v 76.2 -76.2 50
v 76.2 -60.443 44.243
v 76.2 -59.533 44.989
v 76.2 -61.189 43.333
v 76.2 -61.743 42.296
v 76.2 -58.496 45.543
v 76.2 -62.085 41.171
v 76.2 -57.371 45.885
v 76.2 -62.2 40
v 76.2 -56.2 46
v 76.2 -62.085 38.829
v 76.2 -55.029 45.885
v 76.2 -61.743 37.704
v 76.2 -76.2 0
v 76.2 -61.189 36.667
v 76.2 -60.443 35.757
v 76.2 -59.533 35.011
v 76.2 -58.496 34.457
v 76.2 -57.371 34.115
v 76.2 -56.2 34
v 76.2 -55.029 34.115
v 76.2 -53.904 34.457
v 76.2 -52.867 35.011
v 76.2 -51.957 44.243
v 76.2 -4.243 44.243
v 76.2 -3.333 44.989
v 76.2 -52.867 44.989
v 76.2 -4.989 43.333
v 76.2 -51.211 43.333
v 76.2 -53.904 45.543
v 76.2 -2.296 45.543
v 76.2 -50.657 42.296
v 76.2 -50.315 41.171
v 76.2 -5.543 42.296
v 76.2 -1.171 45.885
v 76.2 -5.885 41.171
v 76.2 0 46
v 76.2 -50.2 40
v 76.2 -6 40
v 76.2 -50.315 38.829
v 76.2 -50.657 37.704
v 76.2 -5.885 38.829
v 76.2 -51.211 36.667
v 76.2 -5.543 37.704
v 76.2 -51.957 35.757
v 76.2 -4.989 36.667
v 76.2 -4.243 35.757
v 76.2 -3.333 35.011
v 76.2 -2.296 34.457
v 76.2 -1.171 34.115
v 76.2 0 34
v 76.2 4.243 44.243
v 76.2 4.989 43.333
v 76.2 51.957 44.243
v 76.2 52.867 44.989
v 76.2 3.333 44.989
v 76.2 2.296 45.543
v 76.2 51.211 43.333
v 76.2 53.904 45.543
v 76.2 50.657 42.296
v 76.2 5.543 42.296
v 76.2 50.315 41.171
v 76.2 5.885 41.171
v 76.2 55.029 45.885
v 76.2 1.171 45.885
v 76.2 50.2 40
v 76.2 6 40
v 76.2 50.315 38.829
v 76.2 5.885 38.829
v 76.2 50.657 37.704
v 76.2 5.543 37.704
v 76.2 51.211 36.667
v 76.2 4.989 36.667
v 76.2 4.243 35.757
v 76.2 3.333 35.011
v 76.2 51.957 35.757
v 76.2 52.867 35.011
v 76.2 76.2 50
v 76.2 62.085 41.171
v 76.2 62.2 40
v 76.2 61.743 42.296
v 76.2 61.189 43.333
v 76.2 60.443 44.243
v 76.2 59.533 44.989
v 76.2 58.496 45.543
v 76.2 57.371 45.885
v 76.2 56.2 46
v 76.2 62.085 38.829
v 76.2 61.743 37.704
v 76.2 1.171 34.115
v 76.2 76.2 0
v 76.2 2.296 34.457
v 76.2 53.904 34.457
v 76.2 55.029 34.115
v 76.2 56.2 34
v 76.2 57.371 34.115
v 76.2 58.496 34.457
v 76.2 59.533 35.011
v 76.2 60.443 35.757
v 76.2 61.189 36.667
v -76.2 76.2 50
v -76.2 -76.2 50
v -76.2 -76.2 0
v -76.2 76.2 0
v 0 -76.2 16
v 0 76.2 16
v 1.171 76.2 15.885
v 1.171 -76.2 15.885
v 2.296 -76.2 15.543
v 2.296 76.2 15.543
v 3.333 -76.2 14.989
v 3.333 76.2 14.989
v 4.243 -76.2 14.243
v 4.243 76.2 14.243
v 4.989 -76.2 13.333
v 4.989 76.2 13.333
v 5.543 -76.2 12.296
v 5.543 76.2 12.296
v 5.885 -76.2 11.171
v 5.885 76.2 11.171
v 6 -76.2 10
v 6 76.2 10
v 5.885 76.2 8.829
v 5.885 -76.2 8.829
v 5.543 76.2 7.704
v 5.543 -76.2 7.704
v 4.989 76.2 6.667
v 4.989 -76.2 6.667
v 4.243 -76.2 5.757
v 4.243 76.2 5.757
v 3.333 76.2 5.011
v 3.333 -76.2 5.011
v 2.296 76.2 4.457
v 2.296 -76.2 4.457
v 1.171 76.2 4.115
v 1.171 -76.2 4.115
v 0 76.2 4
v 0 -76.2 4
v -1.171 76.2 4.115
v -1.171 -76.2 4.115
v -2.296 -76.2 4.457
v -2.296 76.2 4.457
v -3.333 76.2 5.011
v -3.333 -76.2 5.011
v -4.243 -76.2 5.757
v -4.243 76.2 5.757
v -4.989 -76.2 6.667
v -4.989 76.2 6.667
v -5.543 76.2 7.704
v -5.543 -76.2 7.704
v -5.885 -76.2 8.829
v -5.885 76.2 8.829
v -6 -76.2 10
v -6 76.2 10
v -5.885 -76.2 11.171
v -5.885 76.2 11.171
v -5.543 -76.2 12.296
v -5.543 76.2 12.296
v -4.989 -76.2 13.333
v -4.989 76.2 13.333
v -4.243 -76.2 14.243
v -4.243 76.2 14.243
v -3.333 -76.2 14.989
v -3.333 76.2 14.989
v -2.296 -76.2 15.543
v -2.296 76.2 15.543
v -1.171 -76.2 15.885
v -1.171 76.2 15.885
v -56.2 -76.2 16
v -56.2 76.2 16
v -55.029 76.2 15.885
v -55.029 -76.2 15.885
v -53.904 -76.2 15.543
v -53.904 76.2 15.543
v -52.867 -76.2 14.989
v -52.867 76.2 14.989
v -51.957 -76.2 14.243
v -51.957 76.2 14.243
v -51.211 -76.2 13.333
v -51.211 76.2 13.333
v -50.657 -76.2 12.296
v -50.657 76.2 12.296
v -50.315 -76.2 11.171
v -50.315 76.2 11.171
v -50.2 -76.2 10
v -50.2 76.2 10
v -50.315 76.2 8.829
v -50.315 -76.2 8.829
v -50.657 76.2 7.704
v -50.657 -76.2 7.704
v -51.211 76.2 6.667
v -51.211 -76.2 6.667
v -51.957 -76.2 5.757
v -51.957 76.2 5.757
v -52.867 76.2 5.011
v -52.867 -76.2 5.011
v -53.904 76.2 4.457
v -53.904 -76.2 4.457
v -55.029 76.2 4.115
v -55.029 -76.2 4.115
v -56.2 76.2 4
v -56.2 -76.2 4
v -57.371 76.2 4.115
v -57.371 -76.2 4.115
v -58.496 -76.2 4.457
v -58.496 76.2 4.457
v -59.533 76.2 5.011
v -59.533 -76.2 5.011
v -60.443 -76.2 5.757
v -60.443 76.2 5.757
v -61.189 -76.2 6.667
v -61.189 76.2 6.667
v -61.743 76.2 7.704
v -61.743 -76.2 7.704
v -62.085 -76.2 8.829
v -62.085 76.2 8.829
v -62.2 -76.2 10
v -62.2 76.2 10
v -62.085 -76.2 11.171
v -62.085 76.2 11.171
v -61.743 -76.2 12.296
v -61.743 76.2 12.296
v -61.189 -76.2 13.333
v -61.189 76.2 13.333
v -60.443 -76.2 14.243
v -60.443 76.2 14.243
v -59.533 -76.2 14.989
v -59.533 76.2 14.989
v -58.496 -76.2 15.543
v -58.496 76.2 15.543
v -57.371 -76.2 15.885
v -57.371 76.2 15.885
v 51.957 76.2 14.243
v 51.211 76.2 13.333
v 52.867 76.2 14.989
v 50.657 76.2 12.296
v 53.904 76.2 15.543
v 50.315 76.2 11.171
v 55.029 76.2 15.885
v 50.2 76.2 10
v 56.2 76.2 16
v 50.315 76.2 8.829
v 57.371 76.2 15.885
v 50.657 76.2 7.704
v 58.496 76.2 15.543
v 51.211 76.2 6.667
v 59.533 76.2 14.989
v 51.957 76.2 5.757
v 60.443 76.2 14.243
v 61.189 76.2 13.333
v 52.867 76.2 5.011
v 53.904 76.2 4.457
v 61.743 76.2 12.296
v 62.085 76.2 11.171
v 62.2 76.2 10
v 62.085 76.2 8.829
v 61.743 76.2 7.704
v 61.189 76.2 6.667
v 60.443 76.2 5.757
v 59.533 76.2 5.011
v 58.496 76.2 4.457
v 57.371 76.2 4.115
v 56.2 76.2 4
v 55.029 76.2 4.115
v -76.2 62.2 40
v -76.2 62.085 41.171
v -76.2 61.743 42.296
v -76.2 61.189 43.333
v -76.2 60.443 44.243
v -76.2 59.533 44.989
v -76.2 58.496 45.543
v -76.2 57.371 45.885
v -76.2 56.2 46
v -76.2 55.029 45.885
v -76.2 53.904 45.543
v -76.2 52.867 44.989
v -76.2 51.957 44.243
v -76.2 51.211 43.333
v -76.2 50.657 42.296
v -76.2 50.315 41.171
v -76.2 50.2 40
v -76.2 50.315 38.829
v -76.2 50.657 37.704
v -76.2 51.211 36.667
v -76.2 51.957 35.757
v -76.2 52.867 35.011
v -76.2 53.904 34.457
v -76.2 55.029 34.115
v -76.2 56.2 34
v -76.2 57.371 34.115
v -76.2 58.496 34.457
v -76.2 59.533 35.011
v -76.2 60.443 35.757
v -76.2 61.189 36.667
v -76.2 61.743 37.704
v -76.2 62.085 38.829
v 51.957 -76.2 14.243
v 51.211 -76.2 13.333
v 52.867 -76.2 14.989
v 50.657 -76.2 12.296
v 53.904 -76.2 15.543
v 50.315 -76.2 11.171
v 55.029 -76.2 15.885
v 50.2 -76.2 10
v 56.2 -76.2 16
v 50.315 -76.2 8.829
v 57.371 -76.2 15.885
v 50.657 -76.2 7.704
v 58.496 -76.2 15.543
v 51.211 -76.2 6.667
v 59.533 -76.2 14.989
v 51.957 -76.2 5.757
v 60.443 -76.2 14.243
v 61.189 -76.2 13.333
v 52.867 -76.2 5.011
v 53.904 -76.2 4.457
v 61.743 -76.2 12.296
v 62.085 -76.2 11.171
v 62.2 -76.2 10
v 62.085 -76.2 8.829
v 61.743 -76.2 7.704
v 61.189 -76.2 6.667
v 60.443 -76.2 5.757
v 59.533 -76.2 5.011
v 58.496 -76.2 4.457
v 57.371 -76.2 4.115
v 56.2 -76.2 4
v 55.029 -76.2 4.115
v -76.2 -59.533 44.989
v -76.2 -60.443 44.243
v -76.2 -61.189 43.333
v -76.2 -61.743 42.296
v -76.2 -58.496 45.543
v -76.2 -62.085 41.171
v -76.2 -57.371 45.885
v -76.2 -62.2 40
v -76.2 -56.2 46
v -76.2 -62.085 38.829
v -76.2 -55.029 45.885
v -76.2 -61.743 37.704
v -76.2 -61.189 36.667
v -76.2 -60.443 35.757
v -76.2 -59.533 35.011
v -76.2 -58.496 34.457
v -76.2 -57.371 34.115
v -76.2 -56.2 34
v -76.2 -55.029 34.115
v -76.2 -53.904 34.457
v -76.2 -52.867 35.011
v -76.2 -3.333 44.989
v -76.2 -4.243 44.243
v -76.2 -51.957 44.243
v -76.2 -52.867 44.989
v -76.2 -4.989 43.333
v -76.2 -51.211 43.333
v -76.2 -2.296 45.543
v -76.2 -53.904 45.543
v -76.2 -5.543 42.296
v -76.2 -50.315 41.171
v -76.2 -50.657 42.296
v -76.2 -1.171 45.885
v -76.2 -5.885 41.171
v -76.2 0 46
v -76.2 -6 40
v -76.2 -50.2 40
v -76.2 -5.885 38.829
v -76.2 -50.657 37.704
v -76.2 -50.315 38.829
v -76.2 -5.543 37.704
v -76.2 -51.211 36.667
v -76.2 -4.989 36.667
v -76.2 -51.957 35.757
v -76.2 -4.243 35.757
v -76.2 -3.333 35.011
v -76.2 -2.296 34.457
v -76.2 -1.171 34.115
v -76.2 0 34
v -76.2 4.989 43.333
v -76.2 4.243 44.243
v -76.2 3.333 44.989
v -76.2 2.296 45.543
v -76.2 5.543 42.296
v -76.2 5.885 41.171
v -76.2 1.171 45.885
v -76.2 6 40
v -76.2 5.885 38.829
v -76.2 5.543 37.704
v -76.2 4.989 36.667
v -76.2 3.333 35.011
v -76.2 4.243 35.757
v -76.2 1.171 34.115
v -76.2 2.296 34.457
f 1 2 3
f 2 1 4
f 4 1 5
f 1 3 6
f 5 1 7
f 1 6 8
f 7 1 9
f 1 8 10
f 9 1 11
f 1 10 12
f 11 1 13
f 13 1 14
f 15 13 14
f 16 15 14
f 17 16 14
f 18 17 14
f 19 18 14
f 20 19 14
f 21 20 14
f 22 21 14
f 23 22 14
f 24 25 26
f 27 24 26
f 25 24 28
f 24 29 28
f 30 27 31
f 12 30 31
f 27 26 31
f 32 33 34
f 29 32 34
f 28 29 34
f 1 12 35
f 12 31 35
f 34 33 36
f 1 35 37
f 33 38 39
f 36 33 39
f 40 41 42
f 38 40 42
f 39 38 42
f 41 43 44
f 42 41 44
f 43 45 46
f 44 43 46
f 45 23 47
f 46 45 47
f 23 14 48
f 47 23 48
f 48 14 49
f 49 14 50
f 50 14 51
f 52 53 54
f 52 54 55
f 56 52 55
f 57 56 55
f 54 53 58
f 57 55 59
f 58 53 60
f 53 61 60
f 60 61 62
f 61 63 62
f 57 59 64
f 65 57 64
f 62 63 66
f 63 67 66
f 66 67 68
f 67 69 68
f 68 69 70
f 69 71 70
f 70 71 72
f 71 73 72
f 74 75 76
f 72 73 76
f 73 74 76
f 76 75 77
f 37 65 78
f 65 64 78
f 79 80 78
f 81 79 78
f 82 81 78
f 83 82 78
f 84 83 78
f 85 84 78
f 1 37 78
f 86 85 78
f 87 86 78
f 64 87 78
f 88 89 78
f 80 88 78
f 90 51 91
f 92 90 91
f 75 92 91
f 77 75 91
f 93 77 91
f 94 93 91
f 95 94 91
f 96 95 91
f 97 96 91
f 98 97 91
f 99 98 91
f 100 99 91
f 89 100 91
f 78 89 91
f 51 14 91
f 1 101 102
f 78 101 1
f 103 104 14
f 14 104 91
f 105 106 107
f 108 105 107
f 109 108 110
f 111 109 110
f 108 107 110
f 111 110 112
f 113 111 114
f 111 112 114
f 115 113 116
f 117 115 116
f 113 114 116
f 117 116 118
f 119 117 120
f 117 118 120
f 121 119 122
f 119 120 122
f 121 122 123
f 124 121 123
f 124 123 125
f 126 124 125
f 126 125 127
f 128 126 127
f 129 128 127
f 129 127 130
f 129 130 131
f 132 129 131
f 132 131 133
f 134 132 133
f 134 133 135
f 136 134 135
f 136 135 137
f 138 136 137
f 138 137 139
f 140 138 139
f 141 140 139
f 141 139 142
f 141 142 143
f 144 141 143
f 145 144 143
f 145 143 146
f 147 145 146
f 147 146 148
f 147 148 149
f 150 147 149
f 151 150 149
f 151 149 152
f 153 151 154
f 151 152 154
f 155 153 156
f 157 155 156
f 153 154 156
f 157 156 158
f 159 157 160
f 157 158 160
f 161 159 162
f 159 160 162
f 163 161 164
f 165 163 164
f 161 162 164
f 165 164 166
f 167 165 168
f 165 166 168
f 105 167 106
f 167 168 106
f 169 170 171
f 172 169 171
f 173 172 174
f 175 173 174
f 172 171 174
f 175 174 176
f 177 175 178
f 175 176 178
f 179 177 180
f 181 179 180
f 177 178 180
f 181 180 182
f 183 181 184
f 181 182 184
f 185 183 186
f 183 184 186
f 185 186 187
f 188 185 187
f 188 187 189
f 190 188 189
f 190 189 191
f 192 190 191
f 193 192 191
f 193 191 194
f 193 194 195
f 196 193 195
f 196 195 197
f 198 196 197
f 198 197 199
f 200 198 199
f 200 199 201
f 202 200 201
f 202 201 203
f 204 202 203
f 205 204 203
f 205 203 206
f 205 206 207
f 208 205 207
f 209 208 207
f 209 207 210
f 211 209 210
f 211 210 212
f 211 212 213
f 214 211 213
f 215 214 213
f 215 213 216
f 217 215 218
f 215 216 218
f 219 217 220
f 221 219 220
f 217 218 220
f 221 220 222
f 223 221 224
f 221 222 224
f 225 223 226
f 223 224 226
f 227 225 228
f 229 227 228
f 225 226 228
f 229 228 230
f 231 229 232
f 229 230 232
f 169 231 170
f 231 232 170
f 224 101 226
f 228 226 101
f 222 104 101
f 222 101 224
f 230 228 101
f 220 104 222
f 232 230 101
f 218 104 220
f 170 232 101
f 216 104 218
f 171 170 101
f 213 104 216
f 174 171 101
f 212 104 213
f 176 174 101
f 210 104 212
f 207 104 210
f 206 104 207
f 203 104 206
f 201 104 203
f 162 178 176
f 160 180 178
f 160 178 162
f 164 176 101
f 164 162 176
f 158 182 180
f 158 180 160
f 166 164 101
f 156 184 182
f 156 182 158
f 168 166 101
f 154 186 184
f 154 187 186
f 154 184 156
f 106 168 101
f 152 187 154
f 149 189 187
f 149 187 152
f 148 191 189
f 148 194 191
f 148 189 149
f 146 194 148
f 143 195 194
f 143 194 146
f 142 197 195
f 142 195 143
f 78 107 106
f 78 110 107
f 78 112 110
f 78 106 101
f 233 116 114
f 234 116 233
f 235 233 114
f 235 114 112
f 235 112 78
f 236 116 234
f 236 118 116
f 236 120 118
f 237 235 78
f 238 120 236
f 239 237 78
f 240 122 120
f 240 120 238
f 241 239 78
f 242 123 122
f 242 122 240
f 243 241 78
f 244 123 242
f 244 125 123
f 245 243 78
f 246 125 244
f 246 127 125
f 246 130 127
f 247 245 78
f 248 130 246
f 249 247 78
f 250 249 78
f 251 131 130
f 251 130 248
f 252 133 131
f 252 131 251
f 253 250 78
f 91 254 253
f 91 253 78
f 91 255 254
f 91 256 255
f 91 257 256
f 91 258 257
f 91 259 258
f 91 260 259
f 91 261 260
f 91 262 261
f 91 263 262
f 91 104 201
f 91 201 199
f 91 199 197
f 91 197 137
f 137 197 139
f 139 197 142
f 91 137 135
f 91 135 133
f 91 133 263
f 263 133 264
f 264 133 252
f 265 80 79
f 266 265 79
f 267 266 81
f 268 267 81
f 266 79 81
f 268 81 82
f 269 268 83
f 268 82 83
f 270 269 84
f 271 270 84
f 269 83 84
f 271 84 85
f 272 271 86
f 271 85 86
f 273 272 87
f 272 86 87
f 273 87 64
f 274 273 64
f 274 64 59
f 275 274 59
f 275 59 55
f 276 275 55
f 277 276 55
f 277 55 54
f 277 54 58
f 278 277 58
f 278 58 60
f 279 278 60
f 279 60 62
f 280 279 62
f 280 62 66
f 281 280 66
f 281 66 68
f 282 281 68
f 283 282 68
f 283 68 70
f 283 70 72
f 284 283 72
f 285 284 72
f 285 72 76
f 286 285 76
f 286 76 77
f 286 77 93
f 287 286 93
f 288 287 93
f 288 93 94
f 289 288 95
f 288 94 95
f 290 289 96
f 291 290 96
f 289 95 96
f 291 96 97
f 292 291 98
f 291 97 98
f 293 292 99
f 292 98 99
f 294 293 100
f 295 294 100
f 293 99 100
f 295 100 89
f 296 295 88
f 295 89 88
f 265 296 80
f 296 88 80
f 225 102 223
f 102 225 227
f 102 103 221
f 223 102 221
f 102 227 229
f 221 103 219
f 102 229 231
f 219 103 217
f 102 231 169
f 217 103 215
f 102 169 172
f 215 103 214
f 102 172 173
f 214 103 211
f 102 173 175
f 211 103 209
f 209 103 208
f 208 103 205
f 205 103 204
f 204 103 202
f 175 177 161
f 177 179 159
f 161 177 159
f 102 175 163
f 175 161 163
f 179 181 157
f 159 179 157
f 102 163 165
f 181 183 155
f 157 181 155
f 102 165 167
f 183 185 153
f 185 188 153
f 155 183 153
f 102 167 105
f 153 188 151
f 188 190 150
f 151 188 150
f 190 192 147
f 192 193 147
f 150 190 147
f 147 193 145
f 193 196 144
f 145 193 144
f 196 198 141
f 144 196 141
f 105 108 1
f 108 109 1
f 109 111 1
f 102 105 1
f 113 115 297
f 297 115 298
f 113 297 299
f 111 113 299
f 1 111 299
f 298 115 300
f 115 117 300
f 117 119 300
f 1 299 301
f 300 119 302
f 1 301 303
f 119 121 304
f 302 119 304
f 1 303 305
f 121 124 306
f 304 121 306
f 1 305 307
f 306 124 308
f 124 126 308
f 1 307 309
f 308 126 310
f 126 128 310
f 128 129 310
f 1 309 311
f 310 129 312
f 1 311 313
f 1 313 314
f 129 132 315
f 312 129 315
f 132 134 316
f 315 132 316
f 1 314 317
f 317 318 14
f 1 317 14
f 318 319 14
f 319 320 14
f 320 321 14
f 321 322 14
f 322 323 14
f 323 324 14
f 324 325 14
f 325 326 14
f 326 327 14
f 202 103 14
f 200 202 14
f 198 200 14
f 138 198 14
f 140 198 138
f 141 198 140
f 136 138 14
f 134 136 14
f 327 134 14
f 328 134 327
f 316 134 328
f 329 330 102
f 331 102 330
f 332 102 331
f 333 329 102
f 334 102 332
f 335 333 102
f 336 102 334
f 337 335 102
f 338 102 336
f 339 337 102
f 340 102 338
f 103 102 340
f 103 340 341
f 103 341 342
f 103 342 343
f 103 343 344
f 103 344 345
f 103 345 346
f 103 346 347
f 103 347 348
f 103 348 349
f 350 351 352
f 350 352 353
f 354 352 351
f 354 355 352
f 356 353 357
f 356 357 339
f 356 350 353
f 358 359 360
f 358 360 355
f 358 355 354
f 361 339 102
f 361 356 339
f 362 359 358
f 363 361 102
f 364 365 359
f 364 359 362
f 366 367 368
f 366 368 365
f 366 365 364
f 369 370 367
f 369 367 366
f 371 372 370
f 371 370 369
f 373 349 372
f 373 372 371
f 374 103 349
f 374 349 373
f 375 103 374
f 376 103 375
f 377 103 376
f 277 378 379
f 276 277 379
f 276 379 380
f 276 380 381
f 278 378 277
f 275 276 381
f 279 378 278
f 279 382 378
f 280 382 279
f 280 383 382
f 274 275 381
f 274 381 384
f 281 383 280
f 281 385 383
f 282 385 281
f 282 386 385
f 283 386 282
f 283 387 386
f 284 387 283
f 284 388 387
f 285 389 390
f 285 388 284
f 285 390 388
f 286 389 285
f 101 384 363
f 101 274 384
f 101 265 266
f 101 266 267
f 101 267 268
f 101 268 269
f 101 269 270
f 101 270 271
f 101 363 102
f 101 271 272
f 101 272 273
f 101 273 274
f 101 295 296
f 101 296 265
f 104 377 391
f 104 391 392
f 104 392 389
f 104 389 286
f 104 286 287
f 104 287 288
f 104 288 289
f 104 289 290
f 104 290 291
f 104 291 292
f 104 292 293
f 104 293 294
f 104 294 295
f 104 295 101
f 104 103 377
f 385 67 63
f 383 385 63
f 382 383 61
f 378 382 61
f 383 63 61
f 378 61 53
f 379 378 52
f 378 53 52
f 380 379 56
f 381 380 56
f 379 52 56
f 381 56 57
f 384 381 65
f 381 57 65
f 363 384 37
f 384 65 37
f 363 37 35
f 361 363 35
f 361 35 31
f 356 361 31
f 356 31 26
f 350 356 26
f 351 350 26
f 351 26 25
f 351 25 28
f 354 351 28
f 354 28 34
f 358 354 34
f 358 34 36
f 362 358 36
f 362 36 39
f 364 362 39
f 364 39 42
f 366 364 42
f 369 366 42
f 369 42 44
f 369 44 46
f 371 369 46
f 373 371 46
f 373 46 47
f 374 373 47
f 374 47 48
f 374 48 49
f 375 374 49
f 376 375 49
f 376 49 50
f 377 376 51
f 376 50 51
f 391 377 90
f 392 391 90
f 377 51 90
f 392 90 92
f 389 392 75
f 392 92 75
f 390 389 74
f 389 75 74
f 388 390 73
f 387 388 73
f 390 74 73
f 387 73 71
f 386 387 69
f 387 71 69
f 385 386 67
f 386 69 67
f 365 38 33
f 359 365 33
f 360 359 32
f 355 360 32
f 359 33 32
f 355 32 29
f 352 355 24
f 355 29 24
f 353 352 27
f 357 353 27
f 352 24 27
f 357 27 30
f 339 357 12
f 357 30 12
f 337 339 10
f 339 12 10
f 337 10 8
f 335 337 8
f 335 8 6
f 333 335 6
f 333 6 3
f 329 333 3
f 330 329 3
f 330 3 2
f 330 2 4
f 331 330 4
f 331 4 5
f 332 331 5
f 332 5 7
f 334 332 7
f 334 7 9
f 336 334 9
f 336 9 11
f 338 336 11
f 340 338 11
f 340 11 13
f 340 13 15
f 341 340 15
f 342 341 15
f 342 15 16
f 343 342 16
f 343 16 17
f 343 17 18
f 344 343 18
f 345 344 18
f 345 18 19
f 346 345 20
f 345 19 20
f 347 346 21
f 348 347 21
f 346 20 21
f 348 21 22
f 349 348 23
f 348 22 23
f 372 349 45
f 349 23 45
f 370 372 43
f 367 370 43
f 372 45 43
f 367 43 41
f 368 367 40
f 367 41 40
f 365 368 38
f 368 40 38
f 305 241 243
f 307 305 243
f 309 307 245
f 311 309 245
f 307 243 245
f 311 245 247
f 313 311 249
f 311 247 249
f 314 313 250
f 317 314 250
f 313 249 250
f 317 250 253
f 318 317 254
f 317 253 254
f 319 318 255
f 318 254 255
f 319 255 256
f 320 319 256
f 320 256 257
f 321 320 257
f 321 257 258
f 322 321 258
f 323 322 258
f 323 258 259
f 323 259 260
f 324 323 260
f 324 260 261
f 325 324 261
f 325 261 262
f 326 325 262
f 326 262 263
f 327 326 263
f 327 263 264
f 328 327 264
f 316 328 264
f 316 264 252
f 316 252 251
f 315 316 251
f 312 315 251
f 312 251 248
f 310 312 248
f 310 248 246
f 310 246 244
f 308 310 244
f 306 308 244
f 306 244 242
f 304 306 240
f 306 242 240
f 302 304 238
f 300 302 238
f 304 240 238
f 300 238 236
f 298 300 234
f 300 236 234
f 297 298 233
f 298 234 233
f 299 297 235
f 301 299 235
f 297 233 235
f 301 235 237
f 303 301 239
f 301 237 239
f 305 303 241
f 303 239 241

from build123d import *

# Parameters (mm, degrees)
SKETCH1_W           = 152.4
SKETCH1_H           = 152.4
BOSS_EXTRUDE1_DEPTH = 50
SKETCH2_R           = 6
CUT_EXTRUDE1_DEPTH  = 178.573083546
SKETCH4_R           = 6
CUT_EXTRUDE2_DEPTH  = 178.573083546


with BuildPart() as part:
    # Sketch1 → Boss-Extrude1 (new body)
    with BuildSketch(Plane.XY):
        Rectangle(SKETCH1_W, SKETCH1_H)
    extrude(amount=BOSS_EXTRUDE1_DEPTH)

    # Sketch2 → Cut-Extrude1 (cut, through all)
    with BuildSketch(Plane(origin=(76.2, 0, 0), x_dir=(0, 0, -1), z_dir=(1, 0, 0))):
        with Locations(Location((-40, 56.2, 0), (0, 0, 90))):
            Circle(SKETCH2_R)
        with Locations(Location((-40, 0, 0), (0, 0, 90))):
            Circle(SKETCH2_R)
        with Locations(Location((-40, -56.2, 0), (0, 0, 90))):
            Circle(SKETCH2_R)
    extrude(amount=-CUT_EXTRUDE1_DEPTH, mode=Mode.SUBTRACT)

    # Sketch4 → Cut-Extrude2 (cut, through all)
    with BuildSketch(Plane(origin=(0, 76.2, 0), x_dir=(1, 0, 0), z_dir=(0, 1, 0))):
        with Locations(Location((-56.2, -10, 0), (0, 0, 270))):
            Circle(SKETCH4_R)
        with Locations(Location((0, -10, 0), (0, 0, 270))):
            Circle(SKETCH4_R)
        with Locations(Location((56.2, -10, 0), (0, 0, 270))):
            Circle(SKETCH4_R)
    extrude(amount=-CUT_EXTRUDE2_DEPTH, mode=Mode.SUBTRACT)


solid = part.part
